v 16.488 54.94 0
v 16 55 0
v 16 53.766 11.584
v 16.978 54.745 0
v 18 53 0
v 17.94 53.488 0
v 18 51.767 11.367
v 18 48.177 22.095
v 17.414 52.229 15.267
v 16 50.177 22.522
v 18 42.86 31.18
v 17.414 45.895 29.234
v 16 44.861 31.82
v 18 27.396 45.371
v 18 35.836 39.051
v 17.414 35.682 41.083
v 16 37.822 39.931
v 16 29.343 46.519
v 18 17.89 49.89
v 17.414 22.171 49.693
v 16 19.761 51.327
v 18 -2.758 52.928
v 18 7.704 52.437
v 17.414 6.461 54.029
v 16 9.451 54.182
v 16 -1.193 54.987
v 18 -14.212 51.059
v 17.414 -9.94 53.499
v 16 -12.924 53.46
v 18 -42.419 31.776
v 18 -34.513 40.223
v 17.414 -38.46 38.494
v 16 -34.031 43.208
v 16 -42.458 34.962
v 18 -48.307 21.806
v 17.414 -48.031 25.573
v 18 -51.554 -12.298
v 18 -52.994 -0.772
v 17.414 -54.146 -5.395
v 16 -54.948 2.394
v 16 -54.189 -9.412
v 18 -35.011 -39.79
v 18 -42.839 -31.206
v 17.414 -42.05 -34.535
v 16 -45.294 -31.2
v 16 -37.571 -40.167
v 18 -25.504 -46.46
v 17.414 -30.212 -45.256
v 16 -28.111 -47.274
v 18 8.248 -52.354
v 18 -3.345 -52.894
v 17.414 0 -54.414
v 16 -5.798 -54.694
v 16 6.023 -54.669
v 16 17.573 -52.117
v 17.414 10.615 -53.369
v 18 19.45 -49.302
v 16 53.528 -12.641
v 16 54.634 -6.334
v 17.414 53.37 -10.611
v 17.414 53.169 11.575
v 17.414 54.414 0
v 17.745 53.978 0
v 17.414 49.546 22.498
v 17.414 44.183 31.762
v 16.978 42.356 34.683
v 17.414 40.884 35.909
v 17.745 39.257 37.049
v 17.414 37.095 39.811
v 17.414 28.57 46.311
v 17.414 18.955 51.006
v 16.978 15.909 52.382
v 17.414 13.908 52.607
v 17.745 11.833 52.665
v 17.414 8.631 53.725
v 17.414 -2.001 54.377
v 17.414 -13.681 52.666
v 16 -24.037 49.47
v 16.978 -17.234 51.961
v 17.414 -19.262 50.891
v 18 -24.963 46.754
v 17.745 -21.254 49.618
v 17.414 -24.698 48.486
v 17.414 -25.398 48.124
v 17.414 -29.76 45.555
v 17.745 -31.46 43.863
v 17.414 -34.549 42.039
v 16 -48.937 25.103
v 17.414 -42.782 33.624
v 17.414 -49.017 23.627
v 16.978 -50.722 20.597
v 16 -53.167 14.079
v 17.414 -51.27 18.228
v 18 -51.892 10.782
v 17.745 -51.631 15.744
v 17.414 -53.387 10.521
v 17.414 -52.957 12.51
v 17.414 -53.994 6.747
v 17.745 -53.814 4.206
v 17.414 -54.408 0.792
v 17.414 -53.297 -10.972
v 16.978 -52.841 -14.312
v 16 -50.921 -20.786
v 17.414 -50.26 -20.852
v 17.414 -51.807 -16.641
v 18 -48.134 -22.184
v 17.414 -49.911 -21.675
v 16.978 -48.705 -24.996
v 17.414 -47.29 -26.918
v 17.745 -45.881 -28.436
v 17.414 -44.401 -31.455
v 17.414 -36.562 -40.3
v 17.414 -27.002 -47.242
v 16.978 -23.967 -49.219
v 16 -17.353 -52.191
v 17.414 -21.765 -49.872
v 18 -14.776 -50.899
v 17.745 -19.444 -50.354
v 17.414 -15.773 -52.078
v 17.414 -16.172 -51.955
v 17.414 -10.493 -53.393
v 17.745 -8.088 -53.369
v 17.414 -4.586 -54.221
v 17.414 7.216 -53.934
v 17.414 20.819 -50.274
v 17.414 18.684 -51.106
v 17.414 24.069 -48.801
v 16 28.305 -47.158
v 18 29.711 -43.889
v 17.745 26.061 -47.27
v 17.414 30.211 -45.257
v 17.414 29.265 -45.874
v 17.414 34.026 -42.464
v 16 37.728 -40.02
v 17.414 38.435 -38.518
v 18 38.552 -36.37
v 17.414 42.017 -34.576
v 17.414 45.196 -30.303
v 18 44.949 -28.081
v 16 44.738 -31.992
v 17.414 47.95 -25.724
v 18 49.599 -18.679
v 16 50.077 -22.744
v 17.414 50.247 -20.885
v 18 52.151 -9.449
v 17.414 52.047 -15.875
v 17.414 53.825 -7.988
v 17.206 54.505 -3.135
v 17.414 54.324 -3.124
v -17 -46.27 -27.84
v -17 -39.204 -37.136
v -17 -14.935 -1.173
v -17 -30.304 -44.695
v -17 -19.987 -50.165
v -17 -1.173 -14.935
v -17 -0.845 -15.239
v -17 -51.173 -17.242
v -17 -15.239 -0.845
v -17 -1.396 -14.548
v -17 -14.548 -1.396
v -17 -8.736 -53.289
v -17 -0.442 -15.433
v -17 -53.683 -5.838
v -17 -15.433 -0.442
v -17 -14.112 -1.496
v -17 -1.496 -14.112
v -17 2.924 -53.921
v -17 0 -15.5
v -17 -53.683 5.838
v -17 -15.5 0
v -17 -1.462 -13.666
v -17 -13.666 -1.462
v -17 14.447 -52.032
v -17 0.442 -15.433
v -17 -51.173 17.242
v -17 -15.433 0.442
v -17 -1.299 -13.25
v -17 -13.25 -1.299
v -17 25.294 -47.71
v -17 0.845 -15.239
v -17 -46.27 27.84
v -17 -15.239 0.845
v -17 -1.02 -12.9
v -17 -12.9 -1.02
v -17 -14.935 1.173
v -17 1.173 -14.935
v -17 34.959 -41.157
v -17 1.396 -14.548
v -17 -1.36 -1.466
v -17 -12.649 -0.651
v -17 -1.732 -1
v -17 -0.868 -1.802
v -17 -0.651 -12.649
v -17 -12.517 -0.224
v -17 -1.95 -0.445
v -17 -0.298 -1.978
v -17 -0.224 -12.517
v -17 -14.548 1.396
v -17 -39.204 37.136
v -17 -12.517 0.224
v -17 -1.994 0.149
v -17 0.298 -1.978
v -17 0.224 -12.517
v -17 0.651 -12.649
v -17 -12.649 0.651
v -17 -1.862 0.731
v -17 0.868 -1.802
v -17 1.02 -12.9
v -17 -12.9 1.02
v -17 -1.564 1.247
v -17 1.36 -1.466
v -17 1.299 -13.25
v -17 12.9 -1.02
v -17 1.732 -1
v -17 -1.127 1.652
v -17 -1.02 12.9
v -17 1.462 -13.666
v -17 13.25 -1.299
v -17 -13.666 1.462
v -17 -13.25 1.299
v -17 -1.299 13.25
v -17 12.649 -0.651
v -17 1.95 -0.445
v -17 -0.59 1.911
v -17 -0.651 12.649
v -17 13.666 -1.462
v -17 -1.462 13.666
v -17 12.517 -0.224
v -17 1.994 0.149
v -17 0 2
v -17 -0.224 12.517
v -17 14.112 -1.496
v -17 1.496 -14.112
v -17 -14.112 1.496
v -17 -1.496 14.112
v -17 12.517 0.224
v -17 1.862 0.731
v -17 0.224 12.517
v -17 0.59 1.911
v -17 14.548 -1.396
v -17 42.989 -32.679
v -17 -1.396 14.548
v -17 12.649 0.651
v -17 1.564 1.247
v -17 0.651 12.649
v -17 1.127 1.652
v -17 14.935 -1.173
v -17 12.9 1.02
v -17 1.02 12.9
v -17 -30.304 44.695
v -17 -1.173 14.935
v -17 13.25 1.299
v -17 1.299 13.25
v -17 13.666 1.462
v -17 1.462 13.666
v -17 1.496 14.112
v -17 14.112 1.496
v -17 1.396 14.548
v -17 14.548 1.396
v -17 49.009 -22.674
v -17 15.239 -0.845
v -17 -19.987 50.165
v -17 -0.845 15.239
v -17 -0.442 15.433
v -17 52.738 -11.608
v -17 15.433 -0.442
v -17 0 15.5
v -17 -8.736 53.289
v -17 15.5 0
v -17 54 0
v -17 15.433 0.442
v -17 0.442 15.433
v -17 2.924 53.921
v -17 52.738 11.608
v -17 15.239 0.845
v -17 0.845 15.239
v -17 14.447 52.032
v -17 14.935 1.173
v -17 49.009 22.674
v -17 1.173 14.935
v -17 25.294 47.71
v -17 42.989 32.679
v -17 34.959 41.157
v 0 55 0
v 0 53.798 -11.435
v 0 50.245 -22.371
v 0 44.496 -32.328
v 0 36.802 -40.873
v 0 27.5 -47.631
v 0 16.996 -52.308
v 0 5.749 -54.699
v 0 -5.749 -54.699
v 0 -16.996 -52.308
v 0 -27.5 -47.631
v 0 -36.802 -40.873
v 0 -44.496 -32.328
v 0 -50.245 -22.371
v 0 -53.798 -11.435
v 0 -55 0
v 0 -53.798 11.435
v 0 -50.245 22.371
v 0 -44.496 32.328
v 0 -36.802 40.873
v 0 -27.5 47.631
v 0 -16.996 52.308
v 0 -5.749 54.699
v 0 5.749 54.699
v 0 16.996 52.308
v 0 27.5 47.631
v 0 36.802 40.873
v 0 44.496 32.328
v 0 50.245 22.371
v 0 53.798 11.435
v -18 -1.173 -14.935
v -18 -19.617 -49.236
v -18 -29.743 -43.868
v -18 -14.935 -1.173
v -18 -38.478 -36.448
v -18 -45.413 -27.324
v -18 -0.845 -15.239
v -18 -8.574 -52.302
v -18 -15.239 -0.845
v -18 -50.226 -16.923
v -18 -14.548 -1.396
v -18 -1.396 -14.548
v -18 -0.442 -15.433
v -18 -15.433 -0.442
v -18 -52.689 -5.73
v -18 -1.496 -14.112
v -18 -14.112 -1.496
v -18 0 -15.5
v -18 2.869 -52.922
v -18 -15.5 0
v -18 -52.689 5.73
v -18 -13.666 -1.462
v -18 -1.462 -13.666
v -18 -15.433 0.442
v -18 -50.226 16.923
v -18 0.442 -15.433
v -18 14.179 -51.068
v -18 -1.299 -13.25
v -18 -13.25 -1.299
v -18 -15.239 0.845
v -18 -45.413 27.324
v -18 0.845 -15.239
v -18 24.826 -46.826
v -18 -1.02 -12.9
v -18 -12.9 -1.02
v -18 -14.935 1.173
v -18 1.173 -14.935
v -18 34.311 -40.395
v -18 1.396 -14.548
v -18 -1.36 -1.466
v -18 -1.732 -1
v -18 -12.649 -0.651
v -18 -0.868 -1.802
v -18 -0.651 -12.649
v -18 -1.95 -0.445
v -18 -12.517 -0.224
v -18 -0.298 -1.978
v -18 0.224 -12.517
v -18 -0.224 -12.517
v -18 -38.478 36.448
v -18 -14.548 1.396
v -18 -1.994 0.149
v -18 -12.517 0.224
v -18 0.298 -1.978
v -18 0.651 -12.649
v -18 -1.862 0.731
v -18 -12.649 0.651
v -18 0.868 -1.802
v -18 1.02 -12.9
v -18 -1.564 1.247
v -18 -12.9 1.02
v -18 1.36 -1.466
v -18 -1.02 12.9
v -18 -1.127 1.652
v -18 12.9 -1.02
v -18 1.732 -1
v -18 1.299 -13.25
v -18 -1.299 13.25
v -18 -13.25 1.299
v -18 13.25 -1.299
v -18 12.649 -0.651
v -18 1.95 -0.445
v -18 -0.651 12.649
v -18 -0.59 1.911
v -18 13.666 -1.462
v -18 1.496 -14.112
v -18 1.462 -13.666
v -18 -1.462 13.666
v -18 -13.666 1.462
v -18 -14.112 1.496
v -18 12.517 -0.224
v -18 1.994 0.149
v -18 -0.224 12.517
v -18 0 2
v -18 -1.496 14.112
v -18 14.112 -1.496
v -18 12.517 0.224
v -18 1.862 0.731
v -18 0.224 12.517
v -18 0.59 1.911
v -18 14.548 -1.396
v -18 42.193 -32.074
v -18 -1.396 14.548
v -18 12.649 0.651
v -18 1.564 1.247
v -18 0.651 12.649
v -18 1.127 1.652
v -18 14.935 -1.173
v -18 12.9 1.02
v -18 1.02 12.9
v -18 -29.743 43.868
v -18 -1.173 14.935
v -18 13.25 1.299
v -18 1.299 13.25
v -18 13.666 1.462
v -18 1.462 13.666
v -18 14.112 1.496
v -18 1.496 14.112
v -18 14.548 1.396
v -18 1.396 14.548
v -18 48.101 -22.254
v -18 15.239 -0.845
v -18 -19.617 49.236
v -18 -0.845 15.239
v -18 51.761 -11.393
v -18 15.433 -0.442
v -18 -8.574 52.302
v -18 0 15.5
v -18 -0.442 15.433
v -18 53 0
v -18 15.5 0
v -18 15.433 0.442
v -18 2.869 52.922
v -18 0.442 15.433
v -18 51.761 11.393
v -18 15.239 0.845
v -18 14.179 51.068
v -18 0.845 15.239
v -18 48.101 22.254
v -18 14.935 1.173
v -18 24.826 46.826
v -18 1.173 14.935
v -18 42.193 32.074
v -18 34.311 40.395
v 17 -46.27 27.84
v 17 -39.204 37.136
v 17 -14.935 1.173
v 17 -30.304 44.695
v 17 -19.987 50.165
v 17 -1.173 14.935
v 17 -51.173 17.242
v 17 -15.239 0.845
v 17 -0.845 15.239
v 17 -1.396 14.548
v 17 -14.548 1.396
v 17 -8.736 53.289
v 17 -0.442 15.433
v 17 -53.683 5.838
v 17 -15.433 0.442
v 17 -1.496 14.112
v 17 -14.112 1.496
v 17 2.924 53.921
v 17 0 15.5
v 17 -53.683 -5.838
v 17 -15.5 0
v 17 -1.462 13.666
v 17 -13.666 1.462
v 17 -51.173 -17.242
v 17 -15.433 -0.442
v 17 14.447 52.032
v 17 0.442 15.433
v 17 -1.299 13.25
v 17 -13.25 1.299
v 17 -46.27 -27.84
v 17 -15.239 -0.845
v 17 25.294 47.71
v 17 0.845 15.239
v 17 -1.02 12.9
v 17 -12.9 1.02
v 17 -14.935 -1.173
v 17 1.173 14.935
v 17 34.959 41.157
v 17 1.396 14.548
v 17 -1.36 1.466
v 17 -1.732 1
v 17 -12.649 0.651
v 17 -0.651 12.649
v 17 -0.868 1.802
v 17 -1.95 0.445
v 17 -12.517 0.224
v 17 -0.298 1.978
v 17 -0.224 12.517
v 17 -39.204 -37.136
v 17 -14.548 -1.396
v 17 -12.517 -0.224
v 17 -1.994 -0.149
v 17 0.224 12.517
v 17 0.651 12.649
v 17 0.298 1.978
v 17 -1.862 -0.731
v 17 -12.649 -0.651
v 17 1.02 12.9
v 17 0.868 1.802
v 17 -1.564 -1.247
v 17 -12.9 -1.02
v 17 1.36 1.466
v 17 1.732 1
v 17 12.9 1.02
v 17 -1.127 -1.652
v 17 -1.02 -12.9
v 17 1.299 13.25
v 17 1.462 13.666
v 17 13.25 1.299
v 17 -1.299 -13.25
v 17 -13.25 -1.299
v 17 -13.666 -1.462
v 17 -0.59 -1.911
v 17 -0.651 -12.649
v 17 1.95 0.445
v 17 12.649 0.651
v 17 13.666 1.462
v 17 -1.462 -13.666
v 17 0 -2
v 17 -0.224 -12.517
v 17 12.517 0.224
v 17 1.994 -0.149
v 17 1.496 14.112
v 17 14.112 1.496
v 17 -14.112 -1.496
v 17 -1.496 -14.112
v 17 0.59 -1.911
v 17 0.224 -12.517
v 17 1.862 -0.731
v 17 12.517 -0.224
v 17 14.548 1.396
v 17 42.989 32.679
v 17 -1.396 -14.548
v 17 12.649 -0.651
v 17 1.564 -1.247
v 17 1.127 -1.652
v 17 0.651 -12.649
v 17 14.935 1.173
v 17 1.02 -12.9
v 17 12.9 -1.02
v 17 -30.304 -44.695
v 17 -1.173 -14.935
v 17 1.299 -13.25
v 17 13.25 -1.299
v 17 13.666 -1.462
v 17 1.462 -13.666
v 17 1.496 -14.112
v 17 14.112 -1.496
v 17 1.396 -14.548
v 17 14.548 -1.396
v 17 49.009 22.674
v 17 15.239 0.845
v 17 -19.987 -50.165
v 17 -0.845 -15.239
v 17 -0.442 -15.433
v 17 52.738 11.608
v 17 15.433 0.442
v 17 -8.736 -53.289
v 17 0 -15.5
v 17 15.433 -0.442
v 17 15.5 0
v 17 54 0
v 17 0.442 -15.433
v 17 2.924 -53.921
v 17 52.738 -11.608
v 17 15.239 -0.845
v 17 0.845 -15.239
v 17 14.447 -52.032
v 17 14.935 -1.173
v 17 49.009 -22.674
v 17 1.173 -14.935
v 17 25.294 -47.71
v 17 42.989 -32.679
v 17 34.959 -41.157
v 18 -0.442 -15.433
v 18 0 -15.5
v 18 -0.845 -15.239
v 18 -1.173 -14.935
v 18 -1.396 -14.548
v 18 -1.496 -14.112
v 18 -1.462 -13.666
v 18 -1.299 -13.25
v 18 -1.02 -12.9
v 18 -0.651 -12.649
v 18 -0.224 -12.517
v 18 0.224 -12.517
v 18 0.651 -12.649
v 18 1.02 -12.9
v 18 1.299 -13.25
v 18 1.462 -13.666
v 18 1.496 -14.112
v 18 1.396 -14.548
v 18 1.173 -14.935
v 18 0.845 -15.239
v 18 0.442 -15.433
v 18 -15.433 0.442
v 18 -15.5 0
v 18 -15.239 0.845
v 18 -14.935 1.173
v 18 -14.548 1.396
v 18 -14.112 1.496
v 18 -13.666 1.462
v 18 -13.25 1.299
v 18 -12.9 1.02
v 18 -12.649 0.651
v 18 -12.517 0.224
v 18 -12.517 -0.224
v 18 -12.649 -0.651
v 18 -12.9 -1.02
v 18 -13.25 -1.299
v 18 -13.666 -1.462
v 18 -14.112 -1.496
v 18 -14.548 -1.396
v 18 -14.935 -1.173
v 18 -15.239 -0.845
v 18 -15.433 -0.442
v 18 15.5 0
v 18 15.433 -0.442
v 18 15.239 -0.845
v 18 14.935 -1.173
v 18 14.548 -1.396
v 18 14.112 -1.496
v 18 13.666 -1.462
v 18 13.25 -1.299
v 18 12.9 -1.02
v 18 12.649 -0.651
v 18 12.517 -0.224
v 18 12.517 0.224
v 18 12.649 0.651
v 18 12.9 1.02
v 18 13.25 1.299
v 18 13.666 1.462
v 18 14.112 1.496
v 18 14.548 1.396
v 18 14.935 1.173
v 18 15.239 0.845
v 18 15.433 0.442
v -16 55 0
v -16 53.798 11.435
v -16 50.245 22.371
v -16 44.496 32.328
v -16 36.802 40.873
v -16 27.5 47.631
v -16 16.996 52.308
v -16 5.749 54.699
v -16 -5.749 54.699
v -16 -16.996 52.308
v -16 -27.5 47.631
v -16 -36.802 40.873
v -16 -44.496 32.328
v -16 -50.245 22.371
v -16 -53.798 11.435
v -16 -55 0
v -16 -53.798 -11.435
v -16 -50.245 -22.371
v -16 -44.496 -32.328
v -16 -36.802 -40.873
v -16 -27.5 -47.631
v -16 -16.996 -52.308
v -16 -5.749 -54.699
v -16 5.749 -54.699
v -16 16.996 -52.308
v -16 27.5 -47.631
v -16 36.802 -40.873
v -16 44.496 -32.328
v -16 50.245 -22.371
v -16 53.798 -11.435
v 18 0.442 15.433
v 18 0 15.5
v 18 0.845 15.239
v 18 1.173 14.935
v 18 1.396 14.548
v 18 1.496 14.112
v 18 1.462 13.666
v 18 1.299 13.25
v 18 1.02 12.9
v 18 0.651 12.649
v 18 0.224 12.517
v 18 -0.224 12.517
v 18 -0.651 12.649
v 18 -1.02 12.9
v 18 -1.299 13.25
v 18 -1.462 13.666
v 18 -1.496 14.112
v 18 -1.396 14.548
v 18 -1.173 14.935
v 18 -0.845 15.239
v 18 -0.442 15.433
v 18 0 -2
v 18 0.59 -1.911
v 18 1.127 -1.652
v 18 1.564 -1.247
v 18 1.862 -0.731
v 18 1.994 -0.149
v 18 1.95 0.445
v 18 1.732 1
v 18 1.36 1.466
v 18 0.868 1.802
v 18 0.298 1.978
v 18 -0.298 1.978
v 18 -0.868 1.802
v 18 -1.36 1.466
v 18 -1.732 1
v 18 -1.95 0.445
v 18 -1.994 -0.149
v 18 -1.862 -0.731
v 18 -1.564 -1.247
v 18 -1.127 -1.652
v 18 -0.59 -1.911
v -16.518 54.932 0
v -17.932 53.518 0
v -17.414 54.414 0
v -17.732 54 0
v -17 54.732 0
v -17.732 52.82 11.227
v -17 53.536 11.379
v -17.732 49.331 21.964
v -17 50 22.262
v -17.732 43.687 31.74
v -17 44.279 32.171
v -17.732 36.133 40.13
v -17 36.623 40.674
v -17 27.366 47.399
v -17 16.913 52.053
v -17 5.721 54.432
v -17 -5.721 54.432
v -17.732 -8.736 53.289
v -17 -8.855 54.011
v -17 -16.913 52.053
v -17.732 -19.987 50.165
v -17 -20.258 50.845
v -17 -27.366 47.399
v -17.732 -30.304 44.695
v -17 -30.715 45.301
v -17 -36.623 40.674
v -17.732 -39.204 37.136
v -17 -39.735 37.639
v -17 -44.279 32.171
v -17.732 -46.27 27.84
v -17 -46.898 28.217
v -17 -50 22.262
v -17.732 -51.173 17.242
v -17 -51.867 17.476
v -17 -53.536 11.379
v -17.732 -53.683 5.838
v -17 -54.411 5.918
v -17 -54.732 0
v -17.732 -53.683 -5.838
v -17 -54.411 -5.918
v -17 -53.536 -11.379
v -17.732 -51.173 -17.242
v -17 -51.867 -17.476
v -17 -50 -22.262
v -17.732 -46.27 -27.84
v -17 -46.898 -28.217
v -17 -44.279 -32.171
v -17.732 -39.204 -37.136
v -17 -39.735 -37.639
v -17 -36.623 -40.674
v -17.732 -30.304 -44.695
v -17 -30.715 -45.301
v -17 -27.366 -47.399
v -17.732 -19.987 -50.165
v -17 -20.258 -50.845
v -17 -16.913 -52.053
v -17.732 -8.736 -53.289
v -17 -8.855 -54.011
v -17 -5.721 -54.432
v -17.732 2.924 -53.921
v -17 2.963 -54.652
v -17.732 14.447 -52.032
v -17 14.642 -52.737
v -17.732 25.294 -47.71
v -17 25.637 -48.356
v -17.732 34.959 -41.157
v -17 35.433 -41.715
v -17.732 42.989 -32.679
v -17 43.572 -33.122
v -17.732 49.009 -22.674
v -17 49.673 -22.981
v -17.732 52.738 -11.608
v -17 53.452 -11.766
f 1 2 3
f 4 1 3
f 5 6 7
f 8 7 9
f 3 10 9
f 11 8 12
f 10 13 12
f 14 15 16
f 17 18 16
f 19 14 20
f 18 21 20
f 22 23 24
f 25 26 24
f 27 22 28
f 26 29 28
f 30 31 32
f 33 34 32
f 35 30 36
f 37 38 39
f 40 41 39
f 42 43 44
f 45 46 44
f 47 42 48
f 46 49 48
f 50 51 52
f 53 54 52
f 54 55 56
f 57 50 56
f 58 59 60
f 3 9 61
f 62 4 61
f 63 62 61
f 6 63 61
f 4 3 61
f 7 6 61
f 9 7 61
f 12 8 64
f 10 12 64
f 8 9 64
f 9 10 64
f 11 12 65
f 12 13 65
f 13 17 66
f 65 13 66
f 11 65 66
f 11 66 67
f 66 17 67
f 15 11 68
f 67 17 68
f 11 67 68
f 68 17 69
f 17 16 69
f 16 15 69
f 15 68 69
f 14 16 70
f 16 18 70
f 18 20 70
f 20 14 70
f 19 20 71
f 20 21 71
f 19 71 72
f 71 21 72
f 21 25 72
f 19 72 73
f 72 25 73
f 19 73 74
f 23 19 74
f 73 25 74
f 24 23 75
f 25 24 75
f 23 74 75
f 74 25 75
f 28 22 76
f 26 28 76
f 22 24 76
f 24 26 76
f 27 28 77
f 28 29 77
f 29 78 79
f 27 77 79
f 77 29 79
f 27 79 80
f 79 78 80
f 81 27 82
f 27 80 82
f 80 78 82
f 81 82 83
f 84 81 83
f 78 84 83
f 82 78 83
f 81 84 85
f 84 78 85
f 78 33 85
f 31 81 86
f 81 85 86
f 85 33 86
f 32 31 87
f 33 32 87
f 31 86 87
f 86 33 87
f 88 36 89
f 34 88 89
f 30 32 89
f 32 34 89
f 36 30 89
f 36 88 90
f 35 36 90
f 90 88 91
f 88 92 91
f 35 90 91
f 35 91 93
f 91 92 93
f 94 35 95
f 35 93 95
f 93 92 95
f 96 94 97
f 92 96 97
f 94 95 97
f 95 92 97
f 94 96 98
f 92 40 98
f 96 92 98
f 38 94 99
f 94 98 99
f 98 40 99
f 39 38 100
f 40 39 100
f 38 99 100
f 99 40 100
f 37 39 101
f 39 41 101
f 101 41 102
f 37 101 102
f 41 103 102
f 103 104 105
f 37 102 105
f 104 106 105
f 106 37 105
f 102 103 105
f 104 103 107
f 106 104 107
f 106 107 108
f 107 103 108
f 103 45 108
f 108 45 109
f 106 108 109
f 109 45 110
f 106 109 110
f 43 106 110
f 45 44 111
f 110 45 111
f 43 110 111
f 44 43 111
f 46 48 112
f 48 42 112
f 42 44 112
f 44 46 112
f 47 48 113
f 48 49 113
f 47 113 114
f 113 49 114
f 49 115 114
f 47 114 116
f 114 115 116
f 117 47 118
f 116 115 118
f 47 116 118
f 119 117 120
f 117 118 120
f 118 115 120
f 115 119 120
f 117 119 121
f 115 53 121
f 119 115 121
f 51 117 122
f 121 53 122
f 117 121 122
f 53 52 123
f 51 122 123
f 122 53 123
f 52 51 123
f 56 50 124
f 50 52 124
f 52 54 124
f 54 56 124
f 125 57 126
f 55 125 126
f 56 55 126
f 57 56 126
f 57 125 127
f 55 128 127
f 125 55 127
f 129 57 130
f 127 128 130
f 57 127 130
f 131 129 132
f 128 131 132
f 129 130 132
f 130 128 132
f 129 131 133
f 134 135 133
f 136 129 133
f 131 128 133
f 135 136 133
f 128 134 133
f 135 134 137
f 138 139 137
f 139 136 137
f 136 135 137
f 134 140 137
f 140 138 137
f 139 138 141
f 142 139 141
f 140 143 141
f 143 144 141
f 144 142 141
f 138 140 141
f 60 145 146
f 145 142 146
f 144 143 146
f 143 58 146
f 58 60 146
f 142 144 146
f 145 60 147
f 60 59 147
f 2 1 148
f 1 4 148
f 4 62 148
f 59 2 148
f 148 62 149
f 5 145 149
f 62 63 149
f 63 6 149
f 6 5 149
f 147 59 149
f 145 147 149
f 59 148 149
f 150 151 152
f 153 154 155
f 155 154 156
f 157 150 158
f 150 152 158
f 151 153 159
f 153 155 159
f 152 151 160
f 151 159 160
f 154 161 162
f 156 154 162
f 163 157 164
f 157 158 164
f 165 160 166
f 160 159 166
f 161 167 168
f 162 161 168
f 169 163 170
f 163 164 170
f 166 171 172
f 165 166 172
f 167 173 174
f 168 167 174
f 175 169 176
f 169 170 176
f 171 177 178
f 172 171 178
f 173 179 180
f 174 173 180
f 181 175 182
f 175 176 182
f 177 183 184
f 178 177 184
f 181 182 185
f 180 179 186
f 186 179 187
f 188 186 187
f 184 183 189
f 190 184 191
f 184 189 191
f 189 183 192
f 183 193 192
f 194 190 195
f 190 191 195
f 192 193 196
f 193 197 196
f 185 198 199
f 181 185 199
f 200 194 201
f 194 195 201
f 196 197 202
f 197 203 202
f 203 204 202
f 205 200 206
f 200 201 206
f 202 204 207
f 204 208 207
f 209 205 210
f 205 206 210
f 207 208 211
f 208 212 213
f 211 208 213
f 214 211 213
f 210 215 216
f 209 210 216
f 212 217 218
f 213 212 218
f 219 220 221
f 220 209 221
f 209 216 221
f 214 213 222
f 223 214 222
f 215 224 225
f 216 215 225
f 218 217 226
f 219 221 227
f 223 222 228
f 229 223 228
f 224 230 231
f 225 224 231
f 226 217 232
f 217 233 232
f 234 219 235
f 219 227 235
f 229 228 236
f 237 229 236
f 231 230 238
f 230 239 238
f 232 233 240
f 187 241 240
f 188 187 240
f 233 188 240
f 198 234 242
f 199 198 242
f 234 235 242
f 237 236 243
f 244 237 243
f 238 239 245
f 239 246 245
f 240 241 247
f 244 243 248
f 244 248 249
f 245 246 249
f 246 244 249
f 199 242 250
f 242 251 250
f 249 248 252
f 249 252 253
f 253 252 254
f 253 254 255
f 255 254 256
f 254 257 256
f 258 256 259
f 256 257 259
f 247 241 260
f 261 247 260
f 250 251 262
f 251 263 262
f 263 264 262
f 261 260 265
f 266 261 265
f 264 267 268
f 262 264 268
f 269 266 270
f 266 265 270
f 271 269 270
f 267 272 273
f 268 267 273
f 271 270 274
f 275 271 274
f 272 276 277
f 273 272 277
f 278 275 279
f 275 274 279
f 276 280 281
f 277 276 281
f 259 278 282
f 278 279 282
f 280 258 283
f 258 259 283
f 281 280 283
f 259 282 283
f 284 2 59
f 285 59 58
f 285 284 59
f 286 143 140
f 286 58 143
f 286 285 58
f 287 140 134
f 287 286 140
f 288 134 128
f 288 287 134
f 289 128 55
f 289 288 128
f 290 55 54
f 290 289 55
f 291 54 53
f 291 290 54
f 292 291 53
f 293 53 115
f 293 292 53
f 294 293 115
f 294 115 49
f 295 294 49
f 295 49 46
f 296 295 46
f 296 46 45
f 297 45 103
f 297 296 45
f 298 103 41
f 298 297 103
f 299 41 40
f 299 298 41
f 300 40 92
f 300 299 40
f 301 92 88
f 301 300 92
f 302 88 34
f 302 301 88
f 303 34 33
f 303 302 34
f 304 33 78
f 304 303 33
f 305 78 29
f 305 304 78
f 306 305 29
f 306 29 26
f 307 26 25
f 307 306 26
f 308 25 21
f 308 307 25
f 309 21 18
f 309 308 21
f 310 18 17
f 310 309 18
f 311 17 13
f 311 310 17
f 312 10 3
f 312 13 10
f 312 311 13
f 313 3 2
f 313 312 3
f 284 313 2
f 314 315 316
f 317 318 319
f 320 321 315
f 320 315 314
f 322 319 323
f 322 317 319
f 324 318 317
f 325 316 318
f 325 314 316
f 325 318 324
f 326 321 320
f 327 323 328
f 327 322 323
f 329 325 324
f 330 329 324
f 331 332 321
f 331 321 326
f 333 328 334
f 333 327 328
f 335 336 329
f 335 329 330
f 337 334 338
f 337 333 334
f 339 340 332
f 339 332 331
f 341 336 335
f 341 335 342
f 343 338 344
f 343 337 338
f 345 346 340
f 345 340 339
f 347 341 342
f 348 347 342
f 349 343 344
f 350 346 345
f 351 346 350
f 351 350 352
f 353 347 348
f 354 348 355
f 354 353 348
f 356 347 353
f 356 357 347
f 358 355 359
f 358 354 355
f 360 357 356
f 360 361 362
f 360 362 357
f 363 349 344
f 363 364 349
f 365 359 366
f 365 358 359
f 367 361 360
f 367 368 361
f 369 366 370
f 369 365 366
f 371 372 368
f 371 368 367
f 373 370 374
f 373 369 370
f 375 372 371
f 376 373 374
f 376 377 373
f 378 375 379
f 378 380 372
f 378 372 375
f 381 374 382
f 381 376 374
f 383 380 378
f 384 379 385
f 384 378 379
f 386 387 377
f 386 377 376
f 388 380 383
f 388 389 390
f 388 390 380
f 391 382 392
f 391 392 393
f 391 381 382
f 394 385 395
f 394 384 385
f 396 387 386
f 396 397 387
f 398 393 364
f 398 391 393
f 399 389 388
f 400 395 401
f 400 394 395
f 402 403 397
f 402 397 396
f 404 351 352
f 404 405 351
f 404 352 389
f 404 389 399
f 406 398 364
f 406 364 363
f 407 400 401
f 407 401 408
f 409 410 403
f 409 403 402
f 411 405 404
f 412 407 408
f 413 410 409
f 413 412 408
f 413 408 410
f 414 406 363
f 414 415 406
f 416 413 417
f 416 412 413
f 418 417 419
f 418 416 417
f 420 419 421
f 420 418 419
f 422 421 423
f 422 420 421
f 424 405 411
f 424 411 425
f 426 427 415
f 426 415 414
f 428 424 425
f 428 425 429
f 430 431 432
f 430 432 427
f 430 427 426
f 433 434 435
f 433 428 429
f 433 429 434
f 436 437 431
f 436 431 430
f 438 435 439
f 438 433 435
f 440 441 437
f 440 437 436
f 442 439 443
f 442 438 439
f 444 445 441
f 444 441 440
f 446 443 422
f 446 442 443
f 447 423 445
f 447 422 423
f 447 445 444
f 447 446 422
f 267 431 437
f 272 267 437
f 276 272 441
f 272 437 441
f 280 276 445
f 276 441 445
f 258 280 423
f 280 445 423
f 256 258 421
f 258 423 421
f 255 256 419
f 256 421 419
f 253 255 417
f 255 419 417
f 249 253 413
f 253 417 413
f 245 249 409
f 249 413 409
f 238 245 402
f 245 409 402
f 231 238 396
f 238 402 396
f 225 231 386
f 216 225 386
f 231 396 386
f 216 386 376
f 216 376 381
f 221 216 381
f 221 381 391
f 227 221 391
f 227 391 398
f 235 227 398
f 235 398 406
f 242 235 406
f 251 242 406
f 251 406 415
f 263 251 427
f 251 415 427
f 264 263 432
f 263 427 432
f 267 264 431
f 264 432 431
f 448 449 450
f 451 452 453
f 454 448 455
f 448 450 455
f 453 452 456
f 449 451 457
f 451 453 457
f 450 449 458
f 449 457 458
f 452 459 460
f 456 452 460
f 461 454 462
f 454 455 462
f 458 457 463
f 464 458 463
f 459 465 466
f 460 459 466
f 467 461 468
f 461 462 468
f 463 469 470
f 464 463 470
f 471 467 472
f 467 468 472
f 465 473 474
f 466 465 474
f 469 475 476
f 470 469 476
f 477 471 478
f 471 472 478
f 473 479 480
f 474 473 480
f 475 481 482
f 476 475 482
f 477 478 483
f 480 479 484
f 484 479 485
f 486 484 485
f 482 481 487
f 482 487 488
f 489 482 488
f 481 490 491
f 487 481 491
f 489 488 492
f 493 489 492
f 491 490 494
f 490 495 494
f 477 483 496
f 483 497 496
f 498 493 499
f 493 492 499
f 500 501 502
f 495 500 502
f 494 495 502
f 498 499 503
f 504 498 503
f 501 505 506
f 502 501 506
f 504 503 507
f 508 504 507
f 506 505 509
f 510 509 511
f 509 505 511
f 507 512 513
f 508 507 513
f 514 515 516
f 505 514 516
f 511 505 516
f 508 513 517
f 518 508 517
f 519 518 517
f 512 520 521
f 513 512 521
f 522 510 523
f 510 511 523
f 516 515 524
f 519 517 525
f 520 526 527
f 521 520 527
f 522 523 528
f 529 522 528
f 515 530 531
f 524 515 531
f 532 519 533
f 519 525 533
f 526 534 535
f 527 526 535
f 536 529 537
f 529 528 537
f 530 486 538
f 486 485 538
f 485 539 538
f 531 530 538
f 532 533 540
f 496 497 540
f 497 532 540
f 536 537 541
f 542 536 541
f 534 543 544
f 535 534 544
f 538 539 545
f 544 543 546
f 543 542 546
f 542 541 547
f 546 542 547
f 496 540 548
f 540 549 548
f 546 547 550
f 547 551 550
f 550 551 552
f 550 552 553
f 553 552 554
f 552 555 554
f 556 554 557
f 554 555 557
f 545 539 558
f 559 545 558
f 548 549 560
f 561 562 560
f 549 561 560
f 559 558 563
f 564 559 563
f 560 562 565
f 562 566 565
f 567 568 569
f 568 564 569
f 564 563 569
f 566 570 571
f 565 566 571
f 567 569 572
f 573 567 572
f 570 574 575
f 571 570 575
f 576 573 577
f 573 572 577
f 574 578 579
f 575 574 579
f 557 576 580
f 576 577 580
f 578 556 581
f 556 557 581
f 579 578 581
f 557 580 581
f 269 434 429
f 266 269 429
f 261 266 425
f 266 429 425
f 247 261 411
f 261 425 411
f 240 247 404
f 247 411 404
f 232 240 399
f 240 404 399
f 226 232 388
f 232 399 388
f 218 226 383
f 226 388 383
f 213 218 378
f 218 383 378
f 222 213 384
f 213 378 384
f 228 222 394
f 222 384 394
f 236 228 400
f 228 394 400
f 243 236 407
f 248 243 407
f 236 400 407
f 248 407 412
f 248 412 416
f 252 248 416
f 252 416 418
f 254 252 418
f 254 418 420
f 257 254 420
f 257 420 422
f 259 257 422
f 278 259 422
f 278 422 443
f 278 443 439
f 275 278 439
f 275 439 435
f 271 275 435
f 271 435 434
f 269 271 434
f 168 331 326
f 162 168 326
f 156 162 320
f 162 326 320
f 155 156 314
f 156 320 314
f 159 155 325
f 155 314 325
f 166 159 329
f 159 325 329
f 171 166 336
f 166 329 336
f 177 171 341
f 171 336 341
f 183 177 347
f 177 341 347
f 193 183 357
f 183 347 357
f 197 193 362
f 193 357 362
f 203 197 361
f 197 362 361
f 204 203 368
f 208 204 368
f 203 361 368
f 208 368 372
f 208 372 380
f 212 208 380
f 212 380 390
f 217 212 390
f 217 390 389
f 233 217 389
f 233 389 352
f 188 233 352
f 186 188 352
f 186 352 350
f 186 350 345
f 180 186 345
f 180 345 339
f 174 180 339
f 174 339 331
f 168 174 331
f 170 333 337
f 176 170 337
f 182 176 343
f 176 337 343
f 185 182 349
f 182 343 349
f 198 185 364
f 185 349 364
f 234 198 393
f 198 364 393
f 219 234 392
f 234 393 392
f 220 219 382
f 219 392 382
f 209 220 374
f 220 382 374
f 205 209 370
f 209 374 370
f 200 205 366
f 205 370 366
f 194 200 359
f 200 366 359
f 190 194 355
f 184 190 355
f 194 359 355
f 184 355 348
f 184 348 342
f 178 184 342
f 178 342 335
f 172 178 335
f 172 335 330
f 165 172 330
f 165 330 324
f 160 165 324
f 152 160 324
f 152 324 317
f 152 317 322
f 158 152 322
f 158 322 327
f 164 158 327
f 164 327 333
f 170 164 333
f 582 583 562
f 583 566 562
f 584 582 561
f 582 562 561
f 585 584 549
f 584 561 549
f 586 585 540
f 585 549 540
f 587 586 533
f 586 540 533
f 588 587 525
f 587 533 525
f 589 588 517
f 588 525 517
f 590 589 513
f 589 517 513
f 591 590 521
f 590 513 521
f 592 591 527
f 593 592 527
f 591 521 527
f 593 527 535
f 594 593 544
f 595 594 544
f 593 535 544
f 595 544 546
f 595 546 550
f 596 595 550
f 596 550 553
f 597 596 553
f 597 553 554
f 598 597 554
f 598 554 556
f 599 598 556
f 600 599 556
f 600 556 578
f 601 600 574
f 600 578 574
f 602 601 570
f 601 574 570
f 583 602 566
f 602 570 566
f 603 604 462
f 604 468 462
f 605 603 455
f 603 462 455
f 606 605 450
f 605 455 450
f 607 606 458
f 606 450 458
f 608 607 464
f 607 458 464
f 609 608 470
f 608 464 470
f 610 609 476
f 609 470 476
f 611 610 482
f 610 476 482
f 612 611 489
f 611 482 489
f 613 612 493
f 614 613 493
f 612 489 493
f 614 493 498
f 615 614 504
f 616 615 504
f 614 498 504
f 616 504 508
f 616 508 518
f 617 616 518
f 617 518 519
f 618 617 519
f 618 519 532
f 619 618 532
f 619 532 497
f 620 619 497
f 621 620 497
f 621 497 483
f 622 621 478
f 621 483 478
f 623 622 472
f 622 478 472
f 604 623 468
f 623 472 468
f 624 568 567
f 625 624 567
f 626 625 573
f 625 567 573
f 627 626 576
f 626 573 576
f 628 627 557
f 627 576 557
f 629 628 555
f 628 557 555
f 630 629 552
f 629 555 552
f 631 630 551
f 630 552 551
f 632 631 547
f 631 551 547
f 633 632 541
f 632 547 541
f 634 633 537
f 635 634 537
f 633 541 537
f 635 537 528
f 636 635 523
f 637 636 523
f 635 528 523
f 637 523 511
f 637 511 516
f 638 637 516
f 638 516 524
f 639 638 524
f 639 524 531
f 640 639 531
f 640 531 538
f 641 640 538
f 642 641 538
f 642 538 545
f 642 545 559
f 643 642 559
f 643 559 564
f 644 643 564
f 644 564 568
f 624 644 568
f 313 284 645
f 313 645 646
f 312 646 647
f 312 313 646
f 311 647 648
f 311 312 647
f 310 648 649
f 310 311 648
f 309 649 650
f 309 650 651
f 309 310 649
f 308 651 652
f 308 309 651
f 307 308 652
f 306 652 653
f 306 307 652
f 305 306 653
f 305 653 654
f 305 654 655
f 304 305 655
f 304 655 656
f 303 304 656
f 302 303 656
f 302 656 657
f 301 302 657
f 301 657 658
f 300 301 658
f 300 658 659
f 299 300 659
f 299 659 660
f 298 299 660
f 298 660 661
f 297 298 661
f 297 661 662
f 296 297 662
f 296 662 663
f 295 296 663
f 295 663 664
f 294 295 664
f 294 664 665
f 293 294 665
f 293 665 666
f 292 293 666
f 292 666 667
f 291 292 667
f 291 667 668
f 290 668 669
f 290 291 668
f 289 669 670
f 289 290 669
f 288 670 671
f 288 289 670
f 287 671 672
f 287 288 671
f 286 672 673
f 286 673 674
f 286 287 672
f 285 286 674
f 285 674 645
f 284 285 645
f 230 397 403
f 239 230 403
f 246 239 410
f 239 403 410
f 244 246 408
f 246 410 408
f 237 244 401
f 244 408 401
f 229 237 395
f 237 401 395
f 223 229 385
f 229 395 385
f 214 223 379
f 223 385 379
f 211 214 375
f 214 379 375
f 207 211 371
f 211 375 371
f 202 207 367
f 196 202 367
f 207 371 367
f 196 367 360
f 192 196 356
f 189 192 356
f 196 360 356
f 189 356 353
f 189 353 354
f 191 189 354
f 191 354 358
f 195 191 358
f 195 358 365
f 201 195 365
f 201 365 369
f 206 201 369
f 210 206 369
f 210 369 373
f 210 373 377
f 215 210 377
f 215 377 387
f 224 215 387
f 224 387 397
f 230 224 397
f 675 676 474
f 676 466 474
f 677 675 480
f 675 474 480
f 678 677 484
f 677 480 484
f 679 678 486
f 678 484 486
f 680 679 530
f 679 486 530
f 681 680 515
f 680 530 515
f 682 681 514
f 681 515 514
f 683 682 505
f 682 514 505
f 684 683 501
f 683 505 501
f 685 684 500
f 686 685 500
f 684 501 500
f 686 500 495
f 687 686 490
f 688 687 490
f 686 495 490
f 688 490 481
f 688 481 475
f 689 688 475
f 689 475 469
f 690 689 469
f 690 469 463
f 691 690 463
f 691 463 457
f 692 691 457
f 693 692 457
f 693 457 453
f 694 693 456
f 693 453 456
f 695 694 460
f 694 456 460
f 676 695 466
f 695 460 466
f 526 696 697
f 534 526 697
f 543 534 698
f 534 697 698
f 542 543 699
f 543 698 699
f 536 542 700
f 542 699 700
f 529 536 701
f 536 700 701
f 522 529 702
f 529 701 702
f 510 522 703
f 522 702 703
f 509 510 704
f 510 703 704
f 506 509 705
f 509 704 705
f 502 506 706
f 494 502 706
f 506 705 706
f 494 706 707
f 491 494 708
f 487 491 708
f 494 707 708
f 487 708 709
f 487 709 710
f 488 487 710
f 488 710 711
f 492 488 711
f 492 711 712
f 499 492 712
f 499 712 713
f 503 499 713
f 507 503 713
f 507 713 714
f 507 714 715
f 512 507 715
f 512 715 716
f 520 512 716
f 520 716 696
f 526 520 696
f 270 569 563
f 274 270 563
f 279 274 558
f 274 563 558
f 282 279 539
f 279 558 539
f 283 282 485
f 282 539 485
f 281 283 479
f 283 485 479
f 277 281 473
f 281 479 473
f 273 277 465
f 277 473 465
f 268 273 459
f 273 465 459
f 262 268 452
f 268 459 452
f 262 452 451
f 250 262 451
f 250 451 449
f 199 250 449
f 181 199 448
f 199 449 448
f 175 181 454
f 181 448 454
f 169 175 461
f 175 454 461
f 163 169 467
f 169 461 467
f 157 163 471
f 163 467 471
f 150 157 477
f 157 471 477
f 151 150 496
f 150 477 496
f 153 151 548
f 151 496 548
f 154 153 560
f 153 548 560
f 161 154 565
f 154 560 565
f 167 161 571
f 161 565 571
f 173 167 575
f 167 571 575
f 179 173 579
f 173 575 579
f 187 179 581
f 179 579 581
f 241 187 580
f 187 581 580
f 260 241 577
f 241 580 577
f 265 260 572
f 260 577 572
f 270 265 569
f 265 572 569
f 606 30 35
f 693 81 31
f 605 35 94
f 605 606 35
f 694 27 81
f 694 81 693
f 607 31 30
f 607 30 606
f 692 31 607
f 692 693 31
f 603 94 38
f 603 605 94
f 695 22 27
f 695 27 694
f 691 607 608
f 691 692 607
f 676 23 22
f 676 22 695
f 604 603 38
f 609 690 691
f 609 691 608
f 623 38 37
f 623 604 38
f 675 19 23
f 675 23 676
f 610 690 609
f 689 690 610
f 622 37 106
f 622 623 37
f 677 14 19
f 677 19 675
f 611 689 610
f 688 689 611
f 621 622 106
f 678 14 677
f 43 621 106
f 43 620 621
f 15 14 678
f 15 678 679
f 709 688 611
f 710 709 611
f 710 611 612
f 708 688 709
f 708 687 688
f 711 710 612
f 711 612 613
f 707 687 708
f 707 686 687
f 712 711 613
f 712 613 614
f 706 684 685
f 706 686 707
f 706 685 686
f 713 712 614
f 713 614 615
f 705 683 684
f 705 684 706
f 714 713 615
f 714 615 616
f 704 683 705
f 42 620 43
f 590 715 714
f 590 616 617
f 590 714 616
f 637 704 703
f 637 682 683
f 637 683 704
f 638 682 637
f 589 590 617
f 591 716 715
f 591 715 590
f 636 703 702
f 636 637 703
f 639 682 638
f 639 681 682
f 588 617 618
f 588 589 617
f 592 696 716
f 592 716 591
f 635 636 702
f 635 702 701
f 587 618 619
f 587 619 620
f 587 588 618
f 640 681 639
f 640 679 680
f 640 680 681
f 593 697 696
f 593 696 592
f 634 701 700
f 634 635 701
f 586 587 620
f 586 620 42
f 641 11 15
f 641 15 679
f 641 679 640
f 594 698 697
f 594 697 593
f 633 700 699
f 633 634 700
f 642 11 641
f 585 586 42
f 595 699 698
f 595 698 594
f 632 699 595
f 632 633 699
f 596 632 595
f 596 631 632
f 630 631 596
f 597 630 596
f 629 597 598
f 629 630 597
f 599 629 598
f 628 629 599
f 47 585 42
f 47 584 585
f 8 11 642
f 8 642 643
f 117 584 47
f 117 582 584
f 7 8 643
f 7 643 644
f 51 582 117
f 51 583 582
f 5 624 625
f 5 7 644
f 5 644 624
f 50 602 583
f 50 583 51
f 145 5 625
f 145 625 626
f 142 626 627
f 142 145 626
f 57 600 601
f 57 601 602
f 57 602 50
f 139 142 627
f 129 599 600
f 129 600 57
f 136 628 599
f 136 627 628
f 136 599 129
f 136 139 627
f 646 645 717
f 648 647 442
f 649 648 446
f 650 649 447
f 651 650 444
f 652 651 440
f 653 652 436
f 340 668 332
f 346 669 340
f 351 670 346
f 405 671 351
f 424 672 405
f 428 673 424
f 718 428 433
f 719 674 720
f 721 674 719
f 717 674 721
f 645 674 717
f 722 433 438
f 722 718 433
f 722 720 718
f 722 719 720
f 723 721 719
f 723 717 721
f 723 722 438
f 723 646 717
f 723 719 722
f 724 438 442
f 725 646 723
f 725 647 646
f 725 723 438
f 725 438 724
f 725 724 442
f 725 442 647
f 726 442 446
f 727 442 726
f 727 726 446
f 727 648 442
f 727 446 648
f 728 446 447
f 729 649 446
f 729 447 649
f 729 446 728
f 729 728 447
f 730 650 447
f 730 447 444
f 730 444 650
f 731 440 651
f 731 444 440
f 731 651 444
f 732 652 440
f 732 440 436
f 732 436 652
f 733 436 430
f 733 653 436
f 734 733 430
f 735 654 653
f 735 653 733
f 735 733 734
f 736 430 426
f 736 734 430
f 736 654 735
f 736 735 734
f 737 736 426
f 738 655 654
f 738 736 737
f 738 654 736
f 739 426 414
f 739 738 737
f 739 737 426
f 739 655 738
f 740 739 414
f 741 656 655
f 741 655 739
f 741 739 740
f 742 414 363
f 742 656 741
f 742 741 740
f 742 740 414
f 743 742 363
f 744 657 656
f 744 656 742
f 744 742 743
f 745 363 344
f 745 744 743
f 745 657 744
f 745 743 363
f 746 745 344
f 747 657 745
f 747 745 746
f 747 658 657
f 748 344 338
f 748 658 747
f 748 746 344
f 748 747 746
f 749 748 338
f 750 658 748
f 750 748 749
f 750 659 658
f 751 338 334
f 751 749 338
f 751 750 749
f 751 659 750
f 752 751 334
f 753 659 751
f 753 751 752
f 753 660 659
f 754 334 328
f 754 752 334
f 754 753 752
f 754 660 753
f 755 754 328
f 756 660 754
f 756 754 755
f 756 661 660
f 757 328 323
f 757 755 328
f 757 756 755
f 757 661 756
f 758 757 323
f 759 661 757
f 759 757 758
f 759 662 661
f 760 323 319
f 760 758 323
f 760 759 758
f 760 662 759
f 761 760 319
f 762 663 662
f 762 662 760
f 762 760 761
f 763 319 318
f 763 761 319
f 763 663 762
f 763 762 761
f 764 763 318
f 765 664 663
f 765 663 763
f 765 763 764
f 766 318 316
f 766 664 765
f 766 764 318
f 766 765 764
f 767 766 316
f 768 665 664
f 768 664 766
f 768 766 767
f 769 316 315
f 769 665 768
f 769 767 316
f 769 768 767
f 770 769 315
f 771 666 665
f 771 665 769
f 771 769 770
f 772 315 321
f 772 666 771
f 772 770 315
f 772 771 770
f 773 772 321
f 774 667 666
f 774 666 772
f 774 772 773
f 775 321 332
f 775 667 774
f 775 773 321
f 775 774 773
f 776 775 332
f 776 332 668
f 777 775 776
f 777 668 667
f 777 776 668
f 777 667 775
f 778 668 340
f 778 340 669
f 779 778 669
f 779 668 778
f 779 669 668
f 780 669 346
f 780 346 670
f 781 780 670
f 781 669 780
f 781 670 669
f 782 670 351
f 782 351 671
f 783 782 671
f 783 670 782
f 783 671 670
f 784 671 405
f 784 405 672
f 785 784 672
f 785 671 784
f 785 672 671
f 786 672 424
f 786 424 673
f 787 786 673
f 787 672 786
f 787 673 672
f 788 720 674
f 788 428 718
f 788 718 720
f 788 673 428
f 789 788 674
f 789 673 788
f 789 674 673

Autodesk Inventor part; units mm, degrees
ref_plane "YZ Plane" through (0, 0, 0) normal (1, 0, 0) x (0, 1, 0)
ref_plane "XZ Plane" through (0, 0, 0) normal (0, 1, 0) x (-1, 0, 0)
ref_plane "XY Plane" through (0, 0, 0) normal (0, 0, 1) x (1, 0, 0)
sketch "스케치1" plane through (0, 0, 0) normal (1, 0, 0) x (0, 1, 0)
  circle A0 centre (0, 0) radius 55
  circle A1 centre (0, 0) radius 54
  dimension "d0" = 110
  dimension "d1" = 1
extrude "돌출1" add sketch "스케치1" along normal mid plane 36
sketch "스케치2" plane through (18, 0, 0) normal (1, 0, 0) x (0, 0, -1)
  circle A0 centre (0, 0) radius 55 projected
  circle A1 centre (0, 0) radius 2
  dimension "d4" = 4
extrude "돌출2" add sketch "스케치2" against normal blind 1
sketch "스케치3" plane through (-18, 0, 0) normal (-1, 0, 0) x (0, 0, 1)
  circle A0 centre (0, 0) radius 2 projected
  circle A1 centre (0, 0) radius 54 projected
extrude "돌출3" add sketch "스케치3" against normal blind 1
sketch "스케치4" plane through (-18, 0, 0) normal (-1, 0, 0) x (0, 0, 1)
  circle A0 centre (0, 0) radius 14
  line L0 (0, 0) -> (14, 0)
  circle A1 centre (14, 0) radius 1.5
  dimension "d9" = 28
  dimension "d10" = 3
extrude "돌출4" cut sketch "스케치4" against normal blind 36 contours L0 A1 A0 | A0 A1 | A0 A1 L0 picked at (14.4441, -0.3905)
pattern_circular "원형 패턴1" count 4 over 360 about axis through (-18, 0, 0) along (1, 0, 0) of "돌출4"
fillet "모깎기1" radius 2 3 edges at (18, 38.8909, -38.8909) (18, -38.8909, 38.8909) (-18, -55, 0)
properties part number "바퀴"
